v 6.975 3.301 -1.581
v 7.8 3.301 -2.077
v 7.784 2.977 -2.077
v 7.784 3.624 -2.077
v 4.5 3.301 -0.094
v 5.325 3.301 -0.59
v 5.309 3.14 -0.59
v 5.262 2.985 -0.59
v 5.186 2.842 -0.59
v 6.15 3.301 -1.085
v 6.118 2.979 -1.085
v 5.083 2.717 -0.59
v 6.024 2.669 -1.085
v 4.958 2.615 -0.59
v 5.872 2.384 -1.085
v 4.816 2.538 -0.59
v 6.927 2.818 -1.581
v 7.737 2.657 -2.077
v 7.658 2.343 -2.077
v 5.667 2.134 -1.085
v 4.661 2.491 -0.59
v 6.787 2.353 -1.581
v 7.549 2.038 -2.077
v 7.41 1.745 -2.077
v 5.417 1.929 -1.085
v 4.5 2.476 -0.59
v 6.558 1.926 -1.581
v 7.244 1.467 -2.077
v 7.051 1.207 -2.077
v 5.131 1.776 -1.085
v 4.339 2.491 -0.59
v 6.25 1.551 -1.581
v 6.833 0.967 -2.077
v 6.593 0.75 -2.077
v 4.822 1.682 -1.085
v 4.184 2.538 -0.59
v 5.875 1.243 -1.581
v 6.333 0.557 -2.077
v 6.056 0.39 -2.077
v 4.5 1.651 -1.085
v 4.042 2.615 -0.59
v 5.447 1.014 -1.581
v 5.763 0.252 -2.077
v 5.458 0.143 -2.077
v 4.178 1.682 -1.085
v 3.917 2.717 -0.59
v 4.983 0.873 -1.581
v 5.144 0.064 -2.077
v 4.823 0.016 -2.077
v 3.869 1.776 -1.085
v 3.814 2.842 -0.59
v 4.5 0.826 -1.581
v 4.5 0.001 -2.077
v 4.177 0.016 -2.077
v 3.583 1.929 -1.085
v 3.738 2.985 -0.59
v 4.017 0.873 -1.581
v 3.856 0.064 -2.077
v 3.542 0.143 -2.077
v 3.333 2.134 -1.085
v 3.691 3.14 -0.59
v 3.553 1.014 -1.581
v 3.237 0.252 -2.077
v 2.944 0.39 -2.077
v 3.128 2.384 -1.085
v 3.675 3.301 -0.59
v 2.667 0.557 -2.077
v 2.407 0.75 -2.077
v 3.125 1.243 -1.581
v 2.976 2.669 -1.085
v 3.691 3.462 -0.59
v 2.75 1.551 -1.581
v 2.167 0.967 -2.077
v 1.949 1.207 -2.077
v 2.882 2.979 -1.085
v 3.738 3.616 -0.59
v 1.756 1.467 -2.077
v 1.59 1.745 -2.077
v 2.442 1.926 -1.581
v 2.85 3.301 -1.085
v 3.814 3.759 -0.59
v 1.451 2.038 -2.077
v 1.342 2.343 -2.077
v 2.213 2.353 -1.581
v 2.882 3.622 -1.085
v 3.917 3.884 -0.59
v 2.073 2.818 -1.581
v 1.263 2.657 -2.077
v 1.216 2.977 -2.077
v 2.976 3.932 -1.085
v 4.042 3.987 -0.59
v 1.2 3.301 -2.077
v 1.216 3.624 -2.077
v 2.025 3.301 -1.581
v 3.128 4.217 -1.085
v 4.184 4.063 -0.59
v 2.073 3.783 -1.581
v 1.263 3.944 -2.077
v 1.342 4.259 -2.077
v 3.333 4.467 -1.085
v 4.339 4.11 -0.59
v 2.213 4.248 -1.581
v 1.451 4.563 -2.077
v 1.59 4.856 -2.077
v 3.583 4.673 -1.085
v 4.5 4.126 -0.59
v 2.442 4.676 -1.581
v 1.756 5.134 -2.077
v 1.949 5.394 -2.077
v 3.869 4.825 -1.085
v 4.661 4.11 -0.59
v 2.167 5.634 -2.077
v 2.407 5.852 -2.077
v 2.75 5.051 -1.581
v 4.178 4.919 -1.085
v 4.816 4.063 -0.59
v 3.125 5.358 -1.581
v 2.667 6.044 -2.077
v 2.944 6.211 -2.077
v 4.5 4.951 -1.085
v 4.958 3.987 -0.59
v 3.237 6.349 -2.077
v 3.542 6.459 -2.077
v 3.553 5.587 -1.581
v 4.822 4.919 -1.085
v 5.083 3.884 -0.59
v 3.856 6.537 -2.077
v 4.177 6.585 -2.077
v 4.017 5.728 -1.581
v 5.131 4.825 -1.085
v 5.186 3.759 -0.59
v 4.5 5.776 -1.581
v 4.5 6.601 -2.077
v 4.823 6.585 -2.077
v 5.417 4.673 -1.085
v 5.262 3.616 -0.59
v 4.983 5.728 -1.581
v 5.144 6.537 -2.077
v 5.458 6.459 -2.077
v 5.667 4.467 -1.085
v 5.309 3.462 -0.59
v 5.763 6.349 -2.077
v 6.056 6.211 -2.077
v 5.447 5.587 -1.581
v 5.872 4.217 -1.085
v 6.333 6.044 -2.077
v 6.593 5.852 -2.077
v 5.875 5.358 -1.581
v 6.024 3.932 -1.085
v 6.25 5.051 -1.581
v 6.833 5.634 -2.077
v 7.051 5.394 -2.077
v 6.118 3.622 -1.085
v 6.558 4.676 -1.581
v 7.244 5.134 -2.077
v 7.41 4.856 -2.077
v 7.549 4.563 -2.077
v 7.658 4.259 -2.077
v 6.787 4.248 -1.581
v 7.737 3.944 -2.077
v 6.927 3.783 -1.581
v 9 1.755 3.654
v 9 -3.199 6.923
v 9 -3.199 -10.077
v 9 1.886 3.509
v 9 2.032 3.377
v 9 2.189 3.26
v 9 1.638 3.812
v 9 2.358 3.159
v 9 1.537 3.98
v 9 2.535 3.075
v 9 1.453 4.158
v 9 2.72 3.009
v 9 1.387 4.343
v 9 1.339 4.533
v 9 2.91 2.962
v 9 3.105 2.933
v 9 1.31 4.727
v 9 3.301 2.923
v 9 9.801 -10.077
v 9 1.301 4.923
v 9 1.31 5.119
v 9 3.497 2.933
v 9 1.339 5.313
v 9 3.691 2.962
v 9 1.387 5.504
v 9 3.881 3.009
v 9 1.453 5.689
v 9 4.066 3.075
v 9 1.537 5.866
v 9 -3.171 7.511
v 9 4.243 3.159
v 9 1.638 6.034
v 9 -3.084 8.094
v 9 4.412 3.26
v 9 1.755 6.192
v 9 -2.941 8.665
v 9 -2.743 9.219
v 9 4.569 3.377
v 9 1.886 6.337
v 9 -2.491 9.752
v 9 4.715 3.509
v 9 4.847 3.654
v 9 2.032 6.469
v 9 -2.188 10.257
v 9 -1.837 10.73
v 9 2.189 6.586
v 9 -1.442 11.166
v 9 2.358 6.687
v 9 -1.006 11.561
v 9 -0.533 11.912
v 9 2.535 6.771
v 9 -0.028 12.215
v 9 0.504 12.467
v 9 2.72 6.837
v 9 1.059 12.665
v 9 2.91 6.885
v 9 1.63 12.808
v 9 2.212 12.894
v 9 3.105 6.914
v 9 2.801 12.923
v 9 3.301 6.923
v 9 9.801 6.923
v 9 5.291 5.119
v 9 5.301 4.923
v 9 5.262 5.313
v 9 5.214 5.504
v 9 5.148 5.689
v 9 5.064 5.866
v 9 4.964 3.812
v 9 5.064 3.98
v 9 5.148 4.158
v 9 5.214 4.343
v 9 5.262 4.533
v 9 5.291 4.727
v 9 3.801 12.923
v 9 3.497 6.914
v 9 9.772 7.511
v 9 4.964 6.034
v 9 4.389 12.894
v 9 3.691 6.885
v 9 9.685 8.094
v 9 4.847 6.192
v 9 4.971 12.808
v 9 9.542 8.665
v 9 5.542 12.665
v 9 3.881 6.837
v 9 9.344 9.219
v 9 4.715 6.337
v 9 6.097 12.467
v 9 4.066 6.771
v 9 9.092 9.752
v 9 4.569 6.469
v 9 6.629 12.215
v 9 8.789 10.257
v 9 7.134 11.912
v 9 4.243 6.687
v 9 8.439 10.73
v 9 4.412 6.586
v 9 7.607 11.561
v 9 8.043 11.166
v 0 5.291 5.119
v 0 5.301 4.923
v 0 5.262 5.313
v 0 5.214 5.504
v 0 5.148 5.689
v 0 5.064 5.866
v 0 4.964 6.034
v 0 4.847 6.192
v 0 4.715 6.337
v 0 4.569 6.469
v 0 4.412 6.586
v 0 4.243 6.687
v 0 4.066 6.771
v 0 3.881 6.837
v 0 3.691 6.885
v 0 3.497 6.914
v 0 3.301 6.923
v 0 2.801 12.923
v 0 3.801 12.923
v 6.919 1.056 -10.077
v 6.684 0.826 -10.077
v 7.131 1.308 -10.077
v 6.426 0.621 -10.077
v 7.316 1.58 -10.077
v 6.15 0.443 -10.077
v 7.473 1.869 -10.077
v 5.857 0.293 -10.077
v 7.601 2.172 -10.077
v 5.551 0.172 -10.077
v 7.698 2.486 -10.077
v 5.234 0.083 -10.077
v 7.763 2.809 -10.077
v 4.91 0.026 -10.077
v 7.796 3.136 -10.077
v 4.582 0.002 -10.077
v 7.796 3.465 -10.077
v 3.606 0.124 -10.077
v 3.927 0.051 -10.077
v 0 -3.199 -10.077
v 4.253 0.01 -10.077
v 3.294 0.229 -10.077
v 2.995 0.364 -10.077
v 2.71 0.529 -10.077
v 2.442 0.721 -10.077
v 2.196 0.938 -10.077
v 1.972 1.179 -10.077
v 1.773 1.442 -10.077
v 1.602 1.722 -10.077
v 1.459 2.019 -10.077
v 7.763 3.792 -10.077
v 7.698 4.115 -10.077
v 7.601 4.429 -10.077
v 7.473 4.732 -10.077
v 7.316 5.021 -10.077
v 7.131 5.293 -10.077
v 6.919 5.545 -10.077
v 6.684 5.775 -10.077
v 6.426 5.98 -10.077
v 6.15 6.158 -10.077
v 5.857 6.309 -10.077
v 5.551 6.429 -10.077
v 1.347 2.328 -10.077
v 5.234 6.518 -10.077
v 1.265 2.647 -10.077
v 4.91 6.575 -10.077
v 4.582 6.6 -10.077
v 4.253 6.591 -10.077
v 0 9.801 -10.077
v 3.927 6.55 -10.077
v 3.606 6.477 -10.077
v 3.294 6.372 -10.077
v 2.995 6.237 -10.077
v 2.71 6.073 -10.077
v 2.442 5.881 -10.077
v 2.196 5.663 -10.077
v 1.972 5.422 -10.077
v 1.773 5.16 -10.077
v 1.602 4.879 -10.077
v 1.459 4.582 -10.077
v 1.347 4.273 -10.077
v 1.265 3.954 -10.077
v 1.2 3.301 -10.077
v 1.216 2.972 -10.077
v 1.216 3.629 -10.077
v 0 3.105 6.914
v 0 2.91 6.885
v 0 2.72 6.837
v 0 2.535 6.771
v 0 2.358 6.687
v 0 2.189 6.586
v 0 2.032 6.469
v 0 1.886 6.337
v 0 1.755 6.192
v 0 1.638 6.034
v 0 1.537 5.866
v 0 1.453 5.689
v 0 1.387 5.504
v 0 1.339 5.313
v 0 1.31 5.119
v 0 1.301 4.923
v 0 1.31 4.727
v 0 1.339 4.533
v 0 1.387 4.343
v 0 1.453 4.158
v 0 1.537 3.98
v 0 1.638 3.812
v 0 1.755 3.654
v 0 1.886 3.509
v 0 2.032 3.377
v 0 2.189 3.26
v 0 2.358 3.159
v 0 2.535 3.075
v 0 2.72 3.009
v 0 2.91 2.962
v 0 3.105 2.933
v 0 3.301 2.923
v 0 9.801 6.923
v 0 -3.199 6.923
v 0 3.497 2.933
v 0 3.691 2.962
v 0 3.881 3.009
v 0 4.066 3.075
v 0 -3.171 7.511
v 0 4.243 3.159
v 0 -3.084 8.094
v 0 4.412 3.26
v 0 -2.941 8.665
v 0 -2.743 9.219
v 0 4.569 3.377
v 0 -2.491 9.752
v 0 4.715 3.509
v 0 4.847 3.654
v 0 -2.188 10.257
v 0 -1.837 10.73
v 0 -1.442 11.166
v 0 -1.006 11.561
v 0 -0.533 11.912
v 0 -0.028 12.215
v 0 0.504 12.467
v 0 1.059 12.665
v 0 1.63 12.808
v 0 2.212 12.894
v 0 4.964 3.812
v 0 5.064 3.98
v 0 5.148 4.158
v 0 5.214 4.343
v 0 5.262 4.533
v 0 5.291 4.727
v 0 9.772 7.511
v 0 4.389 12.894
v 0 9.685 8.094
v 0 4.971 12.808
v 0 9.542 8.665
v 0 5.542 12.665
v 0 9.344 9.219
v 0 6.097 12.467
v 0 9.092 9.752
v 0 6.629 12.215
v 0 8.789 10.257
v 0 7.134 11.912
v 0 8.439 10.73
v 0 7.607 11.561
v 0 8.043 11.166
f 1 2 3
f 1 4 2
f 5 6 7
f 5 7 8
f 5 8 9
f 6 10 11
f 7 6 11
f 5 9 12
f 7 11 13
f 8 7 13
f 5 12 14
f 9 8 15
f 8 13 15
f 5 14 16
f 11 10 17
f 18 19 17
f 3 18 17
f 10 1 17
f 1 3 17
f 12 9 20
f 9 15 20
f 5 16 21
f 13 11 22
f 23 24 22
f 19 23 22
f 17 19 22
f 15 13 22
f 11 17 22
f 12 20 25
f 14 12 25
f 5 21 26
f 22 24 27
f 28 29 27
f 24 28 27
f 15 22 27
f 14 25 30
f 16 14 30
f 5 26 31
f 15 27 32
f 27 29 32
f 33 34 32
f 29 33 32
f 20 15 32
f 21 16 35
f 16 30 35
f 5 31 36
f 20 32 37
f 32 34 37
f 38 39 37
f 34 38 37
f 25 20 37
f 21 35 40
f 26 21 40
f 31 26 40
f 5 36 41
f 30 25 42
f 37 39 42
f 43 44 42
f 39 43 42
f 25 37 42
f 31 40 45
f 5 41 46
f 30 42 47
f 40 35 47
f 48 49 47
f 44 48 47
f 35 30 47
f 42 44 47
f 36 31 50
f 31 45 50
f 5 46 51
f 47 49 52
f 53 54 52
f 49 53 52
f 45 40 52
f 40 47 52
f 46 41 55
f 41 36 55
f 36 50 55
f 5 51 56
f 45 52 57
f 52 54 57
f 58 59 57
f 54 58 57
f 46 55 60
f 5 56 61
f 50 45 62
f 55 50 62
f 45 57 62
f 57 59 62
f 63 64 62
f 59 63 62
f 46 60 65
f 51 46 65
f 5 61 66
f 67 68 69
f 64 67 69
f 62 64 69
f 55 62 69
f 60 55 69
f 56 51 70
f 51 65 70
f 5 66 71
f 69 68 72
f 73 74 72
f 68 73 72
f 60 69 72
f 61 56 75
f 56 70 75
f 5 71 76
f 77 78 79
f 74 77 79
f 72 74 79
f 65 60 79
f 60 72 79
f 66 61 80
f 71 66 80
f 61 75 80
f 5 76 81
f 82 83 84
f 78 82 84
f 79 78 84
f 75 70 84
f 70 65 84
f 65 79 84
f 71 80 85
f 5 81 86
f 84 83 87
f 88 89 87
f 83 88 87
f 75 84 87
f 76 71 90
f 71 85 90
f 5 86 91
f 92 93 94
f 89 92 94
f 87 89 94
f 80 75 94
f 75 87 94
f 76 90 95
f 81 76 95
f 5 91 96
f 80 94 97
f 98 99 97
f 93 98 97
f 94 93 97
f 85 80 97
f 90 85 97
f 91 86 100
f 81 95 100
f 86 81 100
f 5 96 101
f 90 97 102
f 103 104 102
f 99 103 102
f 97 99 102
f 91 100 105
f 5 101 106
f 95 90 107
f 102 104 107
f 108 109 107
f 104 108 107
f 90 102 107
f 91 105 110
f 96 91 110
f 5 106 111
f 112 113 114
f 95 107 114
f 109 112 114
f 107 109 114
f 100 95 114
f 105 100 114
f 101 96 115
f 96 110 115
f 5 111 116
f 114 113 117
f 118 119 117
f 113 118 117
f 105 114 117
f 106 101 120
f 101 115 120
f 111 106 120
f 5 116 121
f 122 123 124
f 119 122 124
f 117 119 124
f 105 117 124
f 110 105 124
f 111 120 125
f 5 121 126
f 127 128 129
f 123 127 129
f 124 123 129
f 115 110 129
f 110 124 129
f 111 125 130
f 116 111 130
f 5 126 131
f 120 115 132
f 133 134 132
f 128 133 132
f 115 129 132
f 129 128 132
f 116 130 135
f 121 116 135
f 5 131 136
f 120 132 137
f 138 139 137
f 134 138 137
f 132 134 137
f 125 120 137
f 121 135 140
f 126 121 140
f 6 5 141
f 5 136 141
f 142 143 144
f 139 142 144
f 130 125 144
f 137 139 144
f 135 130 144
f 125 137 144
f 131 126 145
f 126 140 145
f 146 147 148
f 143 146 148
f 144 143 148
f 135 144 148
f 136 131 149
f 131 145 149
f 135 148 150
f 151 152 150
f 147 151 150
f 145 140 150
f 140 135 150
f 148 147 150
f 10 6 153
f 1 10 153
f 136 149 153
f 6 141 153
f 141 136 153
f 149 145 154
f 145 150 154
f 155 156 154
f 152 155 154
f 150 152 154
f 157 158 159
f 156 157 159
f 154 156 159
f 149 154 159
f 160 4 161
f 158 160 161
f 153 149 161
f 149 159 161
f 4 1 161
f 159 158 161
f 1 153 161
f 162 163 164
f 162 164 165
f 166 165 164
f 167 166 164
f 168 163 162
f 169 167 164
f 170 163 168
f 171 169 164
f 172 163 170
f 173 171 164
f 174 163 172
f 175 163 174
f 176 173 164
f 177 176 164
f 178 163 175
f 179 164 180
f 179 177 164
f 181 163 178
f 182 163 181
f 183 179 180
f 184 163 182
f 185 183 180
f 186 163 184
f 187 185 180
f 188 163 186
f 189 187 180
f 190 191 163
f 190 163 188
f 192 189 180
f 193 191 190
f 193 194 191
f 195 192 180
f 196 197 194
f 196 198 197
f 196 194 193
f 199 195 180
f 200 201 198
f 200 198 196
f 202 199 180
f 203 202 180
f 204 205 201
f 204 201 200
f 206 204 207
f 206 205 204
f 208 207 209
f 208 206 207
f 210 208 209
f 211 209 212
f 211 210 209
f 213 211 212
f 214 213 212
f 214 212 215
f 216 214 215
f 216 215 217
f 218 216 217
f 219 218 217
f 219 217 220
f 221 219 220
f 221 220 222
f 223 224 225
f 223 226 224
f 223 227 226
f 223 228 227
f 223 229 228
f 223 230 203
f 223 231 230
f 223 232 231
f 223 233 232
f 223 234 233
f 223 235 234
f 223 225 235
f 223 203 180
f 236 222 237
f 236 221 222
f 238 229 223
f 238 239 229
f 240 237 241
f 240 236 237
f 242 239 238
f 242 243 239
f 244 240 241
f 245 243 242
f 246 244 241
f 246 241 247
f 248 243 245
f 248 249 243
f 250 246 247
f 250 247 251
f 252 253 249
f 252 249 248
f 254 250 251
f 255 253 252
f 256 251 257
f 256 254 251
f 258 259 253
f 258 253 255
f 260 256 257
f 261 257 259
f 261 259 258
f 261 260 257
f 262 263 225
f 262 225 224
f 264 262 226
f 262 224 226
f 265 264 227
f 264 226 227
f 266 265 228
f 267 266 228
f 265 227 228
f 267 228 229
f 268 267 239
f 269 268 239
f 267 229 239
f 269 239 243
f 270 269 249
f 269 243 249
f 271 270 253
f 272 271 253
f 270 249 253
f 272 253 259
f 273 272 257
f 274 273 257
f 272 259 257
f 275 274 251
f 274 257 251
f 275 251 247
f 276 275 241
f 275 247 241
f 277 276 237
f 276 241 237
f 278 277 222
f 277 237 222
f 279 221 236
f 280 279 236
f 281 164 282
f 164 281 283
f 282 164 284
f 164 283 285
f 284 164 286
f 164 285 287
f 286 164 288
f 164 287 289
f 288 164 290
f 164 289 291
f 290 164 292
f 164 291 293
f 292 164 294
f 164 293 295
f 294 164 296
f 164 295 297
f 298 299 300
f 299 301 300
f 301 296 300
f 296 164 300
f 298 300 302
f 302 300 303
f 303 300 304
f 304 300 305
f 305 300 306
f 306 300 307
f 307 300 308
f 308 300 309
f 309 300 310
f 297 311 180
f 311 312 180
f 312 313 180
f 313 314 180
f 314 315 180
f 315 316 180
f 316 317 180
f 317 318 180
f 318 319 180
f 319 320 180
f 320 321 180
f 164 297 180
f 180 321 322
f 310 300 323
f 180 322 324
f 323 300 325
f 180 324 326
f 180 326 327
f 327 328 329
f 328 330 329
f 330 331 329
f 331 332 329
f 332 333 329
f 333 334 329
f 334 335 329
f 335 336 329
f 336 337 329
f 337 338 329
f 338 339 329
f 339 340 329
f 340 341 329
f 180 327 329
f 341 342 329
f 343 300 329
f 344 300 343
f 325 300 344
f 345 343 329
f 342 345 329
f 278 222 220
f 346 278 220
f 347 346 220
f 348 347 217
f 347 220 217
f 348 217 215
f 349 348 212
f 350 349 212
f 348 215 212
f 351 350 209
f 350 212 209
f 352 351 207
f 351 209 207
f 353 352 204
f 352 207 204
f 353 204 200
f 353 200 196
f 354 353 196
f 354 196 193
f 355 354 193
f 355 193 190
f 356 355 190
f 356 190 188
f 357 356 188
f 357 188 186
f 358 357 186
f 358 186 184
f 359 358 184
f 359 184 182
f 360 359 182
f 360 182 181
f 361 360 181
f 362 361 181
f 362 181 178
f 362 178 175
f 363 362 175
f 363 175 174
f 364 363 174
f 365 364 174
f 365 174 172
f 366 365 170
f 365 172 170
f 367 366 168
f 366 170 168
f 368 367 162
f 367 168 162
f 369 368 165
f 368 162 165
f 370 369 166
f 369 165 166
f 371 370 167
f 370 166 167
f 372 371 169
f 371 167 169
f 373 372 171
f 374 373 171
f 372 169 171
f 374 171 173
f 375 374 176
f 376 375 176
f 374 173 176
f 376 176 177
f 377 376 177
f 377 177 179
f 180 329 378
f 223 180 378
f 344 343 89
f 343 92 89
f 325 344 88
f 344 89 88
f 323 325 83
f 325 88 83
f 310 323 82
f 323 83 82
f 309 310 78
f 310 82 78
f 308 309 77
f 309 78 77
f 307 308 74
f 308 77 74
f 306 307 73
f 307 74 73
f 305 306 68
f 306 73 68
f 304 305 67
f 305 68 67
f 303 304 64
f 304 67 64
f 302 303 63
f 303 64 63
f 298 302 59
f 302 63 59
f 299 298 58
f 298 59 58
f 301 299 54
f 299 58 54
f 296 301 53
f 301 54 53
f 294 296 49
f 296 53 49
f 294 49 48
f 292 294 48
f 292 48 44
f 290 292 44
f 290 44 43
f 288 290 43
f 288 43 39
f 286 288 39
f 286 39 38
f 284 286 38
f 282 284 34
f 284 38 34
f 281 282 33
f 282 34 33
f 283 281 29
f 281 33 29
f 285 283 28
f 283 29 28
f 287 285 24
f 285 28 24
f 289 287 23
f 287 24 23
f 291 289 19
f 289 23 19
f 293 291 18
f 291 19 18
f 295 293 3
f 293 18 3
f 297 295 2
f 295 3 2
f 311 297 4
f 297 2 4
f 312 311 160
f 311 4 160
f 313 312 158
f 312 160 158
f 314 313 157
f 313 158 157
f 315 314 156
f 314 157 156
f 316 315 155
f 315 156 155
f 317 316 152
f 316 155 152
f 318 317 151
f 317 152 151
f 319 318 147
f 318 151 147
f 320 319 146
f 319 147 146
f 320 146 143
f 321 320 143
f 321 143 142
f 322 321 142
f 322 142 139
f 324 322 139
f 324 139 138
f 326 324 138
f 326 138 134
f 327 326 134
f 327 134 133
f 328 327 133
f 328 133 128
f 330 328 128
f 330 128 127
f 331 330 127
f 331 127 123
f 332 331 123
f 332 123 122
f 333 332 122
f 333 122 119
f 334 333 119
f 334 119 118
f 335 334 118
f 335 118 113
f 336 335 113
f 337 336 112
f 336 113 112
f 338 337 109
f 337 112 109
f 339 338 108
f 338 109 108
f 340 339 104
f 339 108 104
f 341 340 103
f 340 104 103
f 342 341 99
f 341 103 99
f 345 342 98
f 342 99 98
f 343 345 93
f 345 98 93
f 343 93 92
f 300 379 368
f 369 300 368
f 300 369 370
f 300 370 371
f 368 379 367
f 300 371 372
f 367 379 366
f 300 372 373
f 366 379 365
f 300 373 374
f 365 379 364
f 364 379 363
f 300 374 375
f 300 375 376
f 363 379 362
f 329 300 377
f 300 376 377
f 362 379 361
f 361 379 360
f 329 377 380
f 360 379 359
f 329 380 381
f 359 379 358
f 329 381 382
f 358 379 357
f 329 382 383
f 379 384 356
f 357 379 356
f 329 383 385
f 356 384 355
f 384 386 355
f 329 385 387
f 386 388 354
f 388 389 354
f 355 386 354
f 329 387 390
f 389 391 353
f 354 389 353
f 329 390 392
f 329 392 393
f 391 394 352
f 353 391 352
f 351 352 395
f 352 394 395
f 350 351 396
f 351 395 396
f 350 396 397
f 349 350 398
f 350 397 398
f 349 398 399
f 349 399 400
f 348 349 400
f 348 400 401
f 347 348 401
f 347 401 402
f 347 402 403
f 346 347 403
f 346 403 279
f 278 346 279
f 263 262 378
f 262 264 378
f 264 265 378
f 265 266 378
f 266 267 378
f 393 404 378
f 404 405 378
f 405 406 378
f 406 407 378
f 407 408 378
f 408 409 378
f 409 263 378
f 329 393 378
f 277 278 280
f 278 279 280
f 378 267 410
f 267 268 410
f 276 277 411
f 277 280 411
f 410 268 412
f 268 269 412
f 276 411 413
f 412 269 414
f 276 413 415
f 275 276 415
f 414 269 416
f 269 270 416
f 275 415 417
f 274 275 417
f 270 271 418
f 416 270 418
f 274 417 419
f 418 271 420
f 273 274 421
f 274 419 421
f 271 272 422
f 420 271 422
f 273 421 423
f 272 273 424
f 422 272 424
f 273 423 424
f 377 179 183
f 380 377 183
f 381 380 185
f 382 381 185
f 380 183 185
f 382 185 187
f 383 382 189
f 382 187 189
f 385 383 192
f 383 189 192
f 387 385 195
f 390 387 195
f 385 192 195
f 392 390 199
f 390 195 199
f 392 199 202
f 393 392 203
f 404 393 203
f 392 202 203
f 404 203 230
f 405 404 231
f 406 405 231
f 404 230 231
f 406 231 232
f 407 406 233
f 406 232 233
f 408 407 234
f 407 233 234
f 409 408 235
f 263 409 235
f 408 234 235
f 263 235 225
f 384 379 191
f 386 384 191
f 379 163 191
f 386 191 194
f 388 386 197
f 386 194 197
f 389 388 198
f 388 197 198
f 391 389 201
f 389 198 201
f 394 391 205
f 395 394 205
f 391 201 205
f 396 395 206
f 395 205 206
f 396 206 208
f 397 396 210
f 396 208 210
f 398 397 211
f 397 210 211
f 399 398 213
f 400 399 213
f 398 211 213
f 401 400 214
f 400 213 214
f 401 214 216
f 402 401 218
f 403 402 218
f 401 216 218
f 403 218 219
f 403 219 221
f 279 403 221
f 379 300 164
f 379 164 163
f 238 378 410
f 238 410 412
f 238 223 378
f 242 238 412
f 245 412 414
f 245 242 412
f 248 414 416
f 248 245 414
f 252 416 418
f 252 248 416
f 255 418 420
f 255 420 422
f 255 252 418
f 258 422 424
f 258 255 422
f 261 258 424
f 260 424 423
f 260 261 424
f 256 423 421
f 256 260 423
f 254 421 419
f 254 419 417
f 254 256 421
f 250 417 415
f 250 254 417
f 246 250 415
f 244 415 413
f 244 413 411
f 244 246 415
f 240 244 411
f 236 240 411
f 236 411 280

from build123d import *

# Parameters (mm, degrees)
F0_W     = 13
F0_H     = 23
F1_DEPTH = 9
F2_R     = 6
F4_DEPTH = 9.001
F6_D     = 6.6
F6_DEPTH = 8
F6_TIP   = 1.9828400428


with BuildPart() as f1:
    # F0 (on Right) → F1 (new body)
    with BuildSketch(Plane.YZ):
        with Locations((3.3005997539, 1.423231575)):
            Rectangle(F0_W, F0_H)
    extrude(amount=F1_DEPTH)

    # F2
    f2_edges = [f1.edges().sort_by_distance(p)[0] for p in [
        (4.5, -3.1994, 12.923232),
        (4.5, 9.8006, 12.923232),
    ]]
    fillet(f2_edges, radius=F2_R)

    # F3 (on face) → F4 (cut, through all)
    with BuildSketch(Plane.YZ.offset(9)):
        with BuildLine():
            ThreePointArc((5.3005997539, 4.923231575), (4.7148133162, 6.3374451374), (3.3005997539, 6.923231575))
            Line((3.3005997539, 6.923231575), (3.3005997539, 2.923231575))
            ThreePointArc((3.3005997539, 2.923231575), (4.7148133162, 3.5090180127), (5.3005997539, 4.923231575))
        make_face()
        with BuildLine():
            Line((3.3005997539, 2.923231575), (3.3005997539, 6.923231575))
            ThreePointArc((3.3005997539, 6.923231575), (1.3005997539, 4.923231575), (3.3005997539, 2.923231575))
        make_face()
    extrude(amount=-F4_DEPTH, mode=Mode.SUBTRACT)

    # F6
    with Locations(Plane(origin=(0, 0, -10.076768425), x_dir=(1, 0, 0), z_dir=(0, 0, -1))):
        with Locations((4.5, -3.3005997539)):
            Hole(F6_D / 2, depth=F6_DEPTH)
            with Locations((0, 0, -(F6_DEPTH + F6_TIP / 2))):  # 118° drill point
                Cone(0, F6_D / 2, F6_TIP, mode=Mode.SUBTRACT)


solid = f1.part
